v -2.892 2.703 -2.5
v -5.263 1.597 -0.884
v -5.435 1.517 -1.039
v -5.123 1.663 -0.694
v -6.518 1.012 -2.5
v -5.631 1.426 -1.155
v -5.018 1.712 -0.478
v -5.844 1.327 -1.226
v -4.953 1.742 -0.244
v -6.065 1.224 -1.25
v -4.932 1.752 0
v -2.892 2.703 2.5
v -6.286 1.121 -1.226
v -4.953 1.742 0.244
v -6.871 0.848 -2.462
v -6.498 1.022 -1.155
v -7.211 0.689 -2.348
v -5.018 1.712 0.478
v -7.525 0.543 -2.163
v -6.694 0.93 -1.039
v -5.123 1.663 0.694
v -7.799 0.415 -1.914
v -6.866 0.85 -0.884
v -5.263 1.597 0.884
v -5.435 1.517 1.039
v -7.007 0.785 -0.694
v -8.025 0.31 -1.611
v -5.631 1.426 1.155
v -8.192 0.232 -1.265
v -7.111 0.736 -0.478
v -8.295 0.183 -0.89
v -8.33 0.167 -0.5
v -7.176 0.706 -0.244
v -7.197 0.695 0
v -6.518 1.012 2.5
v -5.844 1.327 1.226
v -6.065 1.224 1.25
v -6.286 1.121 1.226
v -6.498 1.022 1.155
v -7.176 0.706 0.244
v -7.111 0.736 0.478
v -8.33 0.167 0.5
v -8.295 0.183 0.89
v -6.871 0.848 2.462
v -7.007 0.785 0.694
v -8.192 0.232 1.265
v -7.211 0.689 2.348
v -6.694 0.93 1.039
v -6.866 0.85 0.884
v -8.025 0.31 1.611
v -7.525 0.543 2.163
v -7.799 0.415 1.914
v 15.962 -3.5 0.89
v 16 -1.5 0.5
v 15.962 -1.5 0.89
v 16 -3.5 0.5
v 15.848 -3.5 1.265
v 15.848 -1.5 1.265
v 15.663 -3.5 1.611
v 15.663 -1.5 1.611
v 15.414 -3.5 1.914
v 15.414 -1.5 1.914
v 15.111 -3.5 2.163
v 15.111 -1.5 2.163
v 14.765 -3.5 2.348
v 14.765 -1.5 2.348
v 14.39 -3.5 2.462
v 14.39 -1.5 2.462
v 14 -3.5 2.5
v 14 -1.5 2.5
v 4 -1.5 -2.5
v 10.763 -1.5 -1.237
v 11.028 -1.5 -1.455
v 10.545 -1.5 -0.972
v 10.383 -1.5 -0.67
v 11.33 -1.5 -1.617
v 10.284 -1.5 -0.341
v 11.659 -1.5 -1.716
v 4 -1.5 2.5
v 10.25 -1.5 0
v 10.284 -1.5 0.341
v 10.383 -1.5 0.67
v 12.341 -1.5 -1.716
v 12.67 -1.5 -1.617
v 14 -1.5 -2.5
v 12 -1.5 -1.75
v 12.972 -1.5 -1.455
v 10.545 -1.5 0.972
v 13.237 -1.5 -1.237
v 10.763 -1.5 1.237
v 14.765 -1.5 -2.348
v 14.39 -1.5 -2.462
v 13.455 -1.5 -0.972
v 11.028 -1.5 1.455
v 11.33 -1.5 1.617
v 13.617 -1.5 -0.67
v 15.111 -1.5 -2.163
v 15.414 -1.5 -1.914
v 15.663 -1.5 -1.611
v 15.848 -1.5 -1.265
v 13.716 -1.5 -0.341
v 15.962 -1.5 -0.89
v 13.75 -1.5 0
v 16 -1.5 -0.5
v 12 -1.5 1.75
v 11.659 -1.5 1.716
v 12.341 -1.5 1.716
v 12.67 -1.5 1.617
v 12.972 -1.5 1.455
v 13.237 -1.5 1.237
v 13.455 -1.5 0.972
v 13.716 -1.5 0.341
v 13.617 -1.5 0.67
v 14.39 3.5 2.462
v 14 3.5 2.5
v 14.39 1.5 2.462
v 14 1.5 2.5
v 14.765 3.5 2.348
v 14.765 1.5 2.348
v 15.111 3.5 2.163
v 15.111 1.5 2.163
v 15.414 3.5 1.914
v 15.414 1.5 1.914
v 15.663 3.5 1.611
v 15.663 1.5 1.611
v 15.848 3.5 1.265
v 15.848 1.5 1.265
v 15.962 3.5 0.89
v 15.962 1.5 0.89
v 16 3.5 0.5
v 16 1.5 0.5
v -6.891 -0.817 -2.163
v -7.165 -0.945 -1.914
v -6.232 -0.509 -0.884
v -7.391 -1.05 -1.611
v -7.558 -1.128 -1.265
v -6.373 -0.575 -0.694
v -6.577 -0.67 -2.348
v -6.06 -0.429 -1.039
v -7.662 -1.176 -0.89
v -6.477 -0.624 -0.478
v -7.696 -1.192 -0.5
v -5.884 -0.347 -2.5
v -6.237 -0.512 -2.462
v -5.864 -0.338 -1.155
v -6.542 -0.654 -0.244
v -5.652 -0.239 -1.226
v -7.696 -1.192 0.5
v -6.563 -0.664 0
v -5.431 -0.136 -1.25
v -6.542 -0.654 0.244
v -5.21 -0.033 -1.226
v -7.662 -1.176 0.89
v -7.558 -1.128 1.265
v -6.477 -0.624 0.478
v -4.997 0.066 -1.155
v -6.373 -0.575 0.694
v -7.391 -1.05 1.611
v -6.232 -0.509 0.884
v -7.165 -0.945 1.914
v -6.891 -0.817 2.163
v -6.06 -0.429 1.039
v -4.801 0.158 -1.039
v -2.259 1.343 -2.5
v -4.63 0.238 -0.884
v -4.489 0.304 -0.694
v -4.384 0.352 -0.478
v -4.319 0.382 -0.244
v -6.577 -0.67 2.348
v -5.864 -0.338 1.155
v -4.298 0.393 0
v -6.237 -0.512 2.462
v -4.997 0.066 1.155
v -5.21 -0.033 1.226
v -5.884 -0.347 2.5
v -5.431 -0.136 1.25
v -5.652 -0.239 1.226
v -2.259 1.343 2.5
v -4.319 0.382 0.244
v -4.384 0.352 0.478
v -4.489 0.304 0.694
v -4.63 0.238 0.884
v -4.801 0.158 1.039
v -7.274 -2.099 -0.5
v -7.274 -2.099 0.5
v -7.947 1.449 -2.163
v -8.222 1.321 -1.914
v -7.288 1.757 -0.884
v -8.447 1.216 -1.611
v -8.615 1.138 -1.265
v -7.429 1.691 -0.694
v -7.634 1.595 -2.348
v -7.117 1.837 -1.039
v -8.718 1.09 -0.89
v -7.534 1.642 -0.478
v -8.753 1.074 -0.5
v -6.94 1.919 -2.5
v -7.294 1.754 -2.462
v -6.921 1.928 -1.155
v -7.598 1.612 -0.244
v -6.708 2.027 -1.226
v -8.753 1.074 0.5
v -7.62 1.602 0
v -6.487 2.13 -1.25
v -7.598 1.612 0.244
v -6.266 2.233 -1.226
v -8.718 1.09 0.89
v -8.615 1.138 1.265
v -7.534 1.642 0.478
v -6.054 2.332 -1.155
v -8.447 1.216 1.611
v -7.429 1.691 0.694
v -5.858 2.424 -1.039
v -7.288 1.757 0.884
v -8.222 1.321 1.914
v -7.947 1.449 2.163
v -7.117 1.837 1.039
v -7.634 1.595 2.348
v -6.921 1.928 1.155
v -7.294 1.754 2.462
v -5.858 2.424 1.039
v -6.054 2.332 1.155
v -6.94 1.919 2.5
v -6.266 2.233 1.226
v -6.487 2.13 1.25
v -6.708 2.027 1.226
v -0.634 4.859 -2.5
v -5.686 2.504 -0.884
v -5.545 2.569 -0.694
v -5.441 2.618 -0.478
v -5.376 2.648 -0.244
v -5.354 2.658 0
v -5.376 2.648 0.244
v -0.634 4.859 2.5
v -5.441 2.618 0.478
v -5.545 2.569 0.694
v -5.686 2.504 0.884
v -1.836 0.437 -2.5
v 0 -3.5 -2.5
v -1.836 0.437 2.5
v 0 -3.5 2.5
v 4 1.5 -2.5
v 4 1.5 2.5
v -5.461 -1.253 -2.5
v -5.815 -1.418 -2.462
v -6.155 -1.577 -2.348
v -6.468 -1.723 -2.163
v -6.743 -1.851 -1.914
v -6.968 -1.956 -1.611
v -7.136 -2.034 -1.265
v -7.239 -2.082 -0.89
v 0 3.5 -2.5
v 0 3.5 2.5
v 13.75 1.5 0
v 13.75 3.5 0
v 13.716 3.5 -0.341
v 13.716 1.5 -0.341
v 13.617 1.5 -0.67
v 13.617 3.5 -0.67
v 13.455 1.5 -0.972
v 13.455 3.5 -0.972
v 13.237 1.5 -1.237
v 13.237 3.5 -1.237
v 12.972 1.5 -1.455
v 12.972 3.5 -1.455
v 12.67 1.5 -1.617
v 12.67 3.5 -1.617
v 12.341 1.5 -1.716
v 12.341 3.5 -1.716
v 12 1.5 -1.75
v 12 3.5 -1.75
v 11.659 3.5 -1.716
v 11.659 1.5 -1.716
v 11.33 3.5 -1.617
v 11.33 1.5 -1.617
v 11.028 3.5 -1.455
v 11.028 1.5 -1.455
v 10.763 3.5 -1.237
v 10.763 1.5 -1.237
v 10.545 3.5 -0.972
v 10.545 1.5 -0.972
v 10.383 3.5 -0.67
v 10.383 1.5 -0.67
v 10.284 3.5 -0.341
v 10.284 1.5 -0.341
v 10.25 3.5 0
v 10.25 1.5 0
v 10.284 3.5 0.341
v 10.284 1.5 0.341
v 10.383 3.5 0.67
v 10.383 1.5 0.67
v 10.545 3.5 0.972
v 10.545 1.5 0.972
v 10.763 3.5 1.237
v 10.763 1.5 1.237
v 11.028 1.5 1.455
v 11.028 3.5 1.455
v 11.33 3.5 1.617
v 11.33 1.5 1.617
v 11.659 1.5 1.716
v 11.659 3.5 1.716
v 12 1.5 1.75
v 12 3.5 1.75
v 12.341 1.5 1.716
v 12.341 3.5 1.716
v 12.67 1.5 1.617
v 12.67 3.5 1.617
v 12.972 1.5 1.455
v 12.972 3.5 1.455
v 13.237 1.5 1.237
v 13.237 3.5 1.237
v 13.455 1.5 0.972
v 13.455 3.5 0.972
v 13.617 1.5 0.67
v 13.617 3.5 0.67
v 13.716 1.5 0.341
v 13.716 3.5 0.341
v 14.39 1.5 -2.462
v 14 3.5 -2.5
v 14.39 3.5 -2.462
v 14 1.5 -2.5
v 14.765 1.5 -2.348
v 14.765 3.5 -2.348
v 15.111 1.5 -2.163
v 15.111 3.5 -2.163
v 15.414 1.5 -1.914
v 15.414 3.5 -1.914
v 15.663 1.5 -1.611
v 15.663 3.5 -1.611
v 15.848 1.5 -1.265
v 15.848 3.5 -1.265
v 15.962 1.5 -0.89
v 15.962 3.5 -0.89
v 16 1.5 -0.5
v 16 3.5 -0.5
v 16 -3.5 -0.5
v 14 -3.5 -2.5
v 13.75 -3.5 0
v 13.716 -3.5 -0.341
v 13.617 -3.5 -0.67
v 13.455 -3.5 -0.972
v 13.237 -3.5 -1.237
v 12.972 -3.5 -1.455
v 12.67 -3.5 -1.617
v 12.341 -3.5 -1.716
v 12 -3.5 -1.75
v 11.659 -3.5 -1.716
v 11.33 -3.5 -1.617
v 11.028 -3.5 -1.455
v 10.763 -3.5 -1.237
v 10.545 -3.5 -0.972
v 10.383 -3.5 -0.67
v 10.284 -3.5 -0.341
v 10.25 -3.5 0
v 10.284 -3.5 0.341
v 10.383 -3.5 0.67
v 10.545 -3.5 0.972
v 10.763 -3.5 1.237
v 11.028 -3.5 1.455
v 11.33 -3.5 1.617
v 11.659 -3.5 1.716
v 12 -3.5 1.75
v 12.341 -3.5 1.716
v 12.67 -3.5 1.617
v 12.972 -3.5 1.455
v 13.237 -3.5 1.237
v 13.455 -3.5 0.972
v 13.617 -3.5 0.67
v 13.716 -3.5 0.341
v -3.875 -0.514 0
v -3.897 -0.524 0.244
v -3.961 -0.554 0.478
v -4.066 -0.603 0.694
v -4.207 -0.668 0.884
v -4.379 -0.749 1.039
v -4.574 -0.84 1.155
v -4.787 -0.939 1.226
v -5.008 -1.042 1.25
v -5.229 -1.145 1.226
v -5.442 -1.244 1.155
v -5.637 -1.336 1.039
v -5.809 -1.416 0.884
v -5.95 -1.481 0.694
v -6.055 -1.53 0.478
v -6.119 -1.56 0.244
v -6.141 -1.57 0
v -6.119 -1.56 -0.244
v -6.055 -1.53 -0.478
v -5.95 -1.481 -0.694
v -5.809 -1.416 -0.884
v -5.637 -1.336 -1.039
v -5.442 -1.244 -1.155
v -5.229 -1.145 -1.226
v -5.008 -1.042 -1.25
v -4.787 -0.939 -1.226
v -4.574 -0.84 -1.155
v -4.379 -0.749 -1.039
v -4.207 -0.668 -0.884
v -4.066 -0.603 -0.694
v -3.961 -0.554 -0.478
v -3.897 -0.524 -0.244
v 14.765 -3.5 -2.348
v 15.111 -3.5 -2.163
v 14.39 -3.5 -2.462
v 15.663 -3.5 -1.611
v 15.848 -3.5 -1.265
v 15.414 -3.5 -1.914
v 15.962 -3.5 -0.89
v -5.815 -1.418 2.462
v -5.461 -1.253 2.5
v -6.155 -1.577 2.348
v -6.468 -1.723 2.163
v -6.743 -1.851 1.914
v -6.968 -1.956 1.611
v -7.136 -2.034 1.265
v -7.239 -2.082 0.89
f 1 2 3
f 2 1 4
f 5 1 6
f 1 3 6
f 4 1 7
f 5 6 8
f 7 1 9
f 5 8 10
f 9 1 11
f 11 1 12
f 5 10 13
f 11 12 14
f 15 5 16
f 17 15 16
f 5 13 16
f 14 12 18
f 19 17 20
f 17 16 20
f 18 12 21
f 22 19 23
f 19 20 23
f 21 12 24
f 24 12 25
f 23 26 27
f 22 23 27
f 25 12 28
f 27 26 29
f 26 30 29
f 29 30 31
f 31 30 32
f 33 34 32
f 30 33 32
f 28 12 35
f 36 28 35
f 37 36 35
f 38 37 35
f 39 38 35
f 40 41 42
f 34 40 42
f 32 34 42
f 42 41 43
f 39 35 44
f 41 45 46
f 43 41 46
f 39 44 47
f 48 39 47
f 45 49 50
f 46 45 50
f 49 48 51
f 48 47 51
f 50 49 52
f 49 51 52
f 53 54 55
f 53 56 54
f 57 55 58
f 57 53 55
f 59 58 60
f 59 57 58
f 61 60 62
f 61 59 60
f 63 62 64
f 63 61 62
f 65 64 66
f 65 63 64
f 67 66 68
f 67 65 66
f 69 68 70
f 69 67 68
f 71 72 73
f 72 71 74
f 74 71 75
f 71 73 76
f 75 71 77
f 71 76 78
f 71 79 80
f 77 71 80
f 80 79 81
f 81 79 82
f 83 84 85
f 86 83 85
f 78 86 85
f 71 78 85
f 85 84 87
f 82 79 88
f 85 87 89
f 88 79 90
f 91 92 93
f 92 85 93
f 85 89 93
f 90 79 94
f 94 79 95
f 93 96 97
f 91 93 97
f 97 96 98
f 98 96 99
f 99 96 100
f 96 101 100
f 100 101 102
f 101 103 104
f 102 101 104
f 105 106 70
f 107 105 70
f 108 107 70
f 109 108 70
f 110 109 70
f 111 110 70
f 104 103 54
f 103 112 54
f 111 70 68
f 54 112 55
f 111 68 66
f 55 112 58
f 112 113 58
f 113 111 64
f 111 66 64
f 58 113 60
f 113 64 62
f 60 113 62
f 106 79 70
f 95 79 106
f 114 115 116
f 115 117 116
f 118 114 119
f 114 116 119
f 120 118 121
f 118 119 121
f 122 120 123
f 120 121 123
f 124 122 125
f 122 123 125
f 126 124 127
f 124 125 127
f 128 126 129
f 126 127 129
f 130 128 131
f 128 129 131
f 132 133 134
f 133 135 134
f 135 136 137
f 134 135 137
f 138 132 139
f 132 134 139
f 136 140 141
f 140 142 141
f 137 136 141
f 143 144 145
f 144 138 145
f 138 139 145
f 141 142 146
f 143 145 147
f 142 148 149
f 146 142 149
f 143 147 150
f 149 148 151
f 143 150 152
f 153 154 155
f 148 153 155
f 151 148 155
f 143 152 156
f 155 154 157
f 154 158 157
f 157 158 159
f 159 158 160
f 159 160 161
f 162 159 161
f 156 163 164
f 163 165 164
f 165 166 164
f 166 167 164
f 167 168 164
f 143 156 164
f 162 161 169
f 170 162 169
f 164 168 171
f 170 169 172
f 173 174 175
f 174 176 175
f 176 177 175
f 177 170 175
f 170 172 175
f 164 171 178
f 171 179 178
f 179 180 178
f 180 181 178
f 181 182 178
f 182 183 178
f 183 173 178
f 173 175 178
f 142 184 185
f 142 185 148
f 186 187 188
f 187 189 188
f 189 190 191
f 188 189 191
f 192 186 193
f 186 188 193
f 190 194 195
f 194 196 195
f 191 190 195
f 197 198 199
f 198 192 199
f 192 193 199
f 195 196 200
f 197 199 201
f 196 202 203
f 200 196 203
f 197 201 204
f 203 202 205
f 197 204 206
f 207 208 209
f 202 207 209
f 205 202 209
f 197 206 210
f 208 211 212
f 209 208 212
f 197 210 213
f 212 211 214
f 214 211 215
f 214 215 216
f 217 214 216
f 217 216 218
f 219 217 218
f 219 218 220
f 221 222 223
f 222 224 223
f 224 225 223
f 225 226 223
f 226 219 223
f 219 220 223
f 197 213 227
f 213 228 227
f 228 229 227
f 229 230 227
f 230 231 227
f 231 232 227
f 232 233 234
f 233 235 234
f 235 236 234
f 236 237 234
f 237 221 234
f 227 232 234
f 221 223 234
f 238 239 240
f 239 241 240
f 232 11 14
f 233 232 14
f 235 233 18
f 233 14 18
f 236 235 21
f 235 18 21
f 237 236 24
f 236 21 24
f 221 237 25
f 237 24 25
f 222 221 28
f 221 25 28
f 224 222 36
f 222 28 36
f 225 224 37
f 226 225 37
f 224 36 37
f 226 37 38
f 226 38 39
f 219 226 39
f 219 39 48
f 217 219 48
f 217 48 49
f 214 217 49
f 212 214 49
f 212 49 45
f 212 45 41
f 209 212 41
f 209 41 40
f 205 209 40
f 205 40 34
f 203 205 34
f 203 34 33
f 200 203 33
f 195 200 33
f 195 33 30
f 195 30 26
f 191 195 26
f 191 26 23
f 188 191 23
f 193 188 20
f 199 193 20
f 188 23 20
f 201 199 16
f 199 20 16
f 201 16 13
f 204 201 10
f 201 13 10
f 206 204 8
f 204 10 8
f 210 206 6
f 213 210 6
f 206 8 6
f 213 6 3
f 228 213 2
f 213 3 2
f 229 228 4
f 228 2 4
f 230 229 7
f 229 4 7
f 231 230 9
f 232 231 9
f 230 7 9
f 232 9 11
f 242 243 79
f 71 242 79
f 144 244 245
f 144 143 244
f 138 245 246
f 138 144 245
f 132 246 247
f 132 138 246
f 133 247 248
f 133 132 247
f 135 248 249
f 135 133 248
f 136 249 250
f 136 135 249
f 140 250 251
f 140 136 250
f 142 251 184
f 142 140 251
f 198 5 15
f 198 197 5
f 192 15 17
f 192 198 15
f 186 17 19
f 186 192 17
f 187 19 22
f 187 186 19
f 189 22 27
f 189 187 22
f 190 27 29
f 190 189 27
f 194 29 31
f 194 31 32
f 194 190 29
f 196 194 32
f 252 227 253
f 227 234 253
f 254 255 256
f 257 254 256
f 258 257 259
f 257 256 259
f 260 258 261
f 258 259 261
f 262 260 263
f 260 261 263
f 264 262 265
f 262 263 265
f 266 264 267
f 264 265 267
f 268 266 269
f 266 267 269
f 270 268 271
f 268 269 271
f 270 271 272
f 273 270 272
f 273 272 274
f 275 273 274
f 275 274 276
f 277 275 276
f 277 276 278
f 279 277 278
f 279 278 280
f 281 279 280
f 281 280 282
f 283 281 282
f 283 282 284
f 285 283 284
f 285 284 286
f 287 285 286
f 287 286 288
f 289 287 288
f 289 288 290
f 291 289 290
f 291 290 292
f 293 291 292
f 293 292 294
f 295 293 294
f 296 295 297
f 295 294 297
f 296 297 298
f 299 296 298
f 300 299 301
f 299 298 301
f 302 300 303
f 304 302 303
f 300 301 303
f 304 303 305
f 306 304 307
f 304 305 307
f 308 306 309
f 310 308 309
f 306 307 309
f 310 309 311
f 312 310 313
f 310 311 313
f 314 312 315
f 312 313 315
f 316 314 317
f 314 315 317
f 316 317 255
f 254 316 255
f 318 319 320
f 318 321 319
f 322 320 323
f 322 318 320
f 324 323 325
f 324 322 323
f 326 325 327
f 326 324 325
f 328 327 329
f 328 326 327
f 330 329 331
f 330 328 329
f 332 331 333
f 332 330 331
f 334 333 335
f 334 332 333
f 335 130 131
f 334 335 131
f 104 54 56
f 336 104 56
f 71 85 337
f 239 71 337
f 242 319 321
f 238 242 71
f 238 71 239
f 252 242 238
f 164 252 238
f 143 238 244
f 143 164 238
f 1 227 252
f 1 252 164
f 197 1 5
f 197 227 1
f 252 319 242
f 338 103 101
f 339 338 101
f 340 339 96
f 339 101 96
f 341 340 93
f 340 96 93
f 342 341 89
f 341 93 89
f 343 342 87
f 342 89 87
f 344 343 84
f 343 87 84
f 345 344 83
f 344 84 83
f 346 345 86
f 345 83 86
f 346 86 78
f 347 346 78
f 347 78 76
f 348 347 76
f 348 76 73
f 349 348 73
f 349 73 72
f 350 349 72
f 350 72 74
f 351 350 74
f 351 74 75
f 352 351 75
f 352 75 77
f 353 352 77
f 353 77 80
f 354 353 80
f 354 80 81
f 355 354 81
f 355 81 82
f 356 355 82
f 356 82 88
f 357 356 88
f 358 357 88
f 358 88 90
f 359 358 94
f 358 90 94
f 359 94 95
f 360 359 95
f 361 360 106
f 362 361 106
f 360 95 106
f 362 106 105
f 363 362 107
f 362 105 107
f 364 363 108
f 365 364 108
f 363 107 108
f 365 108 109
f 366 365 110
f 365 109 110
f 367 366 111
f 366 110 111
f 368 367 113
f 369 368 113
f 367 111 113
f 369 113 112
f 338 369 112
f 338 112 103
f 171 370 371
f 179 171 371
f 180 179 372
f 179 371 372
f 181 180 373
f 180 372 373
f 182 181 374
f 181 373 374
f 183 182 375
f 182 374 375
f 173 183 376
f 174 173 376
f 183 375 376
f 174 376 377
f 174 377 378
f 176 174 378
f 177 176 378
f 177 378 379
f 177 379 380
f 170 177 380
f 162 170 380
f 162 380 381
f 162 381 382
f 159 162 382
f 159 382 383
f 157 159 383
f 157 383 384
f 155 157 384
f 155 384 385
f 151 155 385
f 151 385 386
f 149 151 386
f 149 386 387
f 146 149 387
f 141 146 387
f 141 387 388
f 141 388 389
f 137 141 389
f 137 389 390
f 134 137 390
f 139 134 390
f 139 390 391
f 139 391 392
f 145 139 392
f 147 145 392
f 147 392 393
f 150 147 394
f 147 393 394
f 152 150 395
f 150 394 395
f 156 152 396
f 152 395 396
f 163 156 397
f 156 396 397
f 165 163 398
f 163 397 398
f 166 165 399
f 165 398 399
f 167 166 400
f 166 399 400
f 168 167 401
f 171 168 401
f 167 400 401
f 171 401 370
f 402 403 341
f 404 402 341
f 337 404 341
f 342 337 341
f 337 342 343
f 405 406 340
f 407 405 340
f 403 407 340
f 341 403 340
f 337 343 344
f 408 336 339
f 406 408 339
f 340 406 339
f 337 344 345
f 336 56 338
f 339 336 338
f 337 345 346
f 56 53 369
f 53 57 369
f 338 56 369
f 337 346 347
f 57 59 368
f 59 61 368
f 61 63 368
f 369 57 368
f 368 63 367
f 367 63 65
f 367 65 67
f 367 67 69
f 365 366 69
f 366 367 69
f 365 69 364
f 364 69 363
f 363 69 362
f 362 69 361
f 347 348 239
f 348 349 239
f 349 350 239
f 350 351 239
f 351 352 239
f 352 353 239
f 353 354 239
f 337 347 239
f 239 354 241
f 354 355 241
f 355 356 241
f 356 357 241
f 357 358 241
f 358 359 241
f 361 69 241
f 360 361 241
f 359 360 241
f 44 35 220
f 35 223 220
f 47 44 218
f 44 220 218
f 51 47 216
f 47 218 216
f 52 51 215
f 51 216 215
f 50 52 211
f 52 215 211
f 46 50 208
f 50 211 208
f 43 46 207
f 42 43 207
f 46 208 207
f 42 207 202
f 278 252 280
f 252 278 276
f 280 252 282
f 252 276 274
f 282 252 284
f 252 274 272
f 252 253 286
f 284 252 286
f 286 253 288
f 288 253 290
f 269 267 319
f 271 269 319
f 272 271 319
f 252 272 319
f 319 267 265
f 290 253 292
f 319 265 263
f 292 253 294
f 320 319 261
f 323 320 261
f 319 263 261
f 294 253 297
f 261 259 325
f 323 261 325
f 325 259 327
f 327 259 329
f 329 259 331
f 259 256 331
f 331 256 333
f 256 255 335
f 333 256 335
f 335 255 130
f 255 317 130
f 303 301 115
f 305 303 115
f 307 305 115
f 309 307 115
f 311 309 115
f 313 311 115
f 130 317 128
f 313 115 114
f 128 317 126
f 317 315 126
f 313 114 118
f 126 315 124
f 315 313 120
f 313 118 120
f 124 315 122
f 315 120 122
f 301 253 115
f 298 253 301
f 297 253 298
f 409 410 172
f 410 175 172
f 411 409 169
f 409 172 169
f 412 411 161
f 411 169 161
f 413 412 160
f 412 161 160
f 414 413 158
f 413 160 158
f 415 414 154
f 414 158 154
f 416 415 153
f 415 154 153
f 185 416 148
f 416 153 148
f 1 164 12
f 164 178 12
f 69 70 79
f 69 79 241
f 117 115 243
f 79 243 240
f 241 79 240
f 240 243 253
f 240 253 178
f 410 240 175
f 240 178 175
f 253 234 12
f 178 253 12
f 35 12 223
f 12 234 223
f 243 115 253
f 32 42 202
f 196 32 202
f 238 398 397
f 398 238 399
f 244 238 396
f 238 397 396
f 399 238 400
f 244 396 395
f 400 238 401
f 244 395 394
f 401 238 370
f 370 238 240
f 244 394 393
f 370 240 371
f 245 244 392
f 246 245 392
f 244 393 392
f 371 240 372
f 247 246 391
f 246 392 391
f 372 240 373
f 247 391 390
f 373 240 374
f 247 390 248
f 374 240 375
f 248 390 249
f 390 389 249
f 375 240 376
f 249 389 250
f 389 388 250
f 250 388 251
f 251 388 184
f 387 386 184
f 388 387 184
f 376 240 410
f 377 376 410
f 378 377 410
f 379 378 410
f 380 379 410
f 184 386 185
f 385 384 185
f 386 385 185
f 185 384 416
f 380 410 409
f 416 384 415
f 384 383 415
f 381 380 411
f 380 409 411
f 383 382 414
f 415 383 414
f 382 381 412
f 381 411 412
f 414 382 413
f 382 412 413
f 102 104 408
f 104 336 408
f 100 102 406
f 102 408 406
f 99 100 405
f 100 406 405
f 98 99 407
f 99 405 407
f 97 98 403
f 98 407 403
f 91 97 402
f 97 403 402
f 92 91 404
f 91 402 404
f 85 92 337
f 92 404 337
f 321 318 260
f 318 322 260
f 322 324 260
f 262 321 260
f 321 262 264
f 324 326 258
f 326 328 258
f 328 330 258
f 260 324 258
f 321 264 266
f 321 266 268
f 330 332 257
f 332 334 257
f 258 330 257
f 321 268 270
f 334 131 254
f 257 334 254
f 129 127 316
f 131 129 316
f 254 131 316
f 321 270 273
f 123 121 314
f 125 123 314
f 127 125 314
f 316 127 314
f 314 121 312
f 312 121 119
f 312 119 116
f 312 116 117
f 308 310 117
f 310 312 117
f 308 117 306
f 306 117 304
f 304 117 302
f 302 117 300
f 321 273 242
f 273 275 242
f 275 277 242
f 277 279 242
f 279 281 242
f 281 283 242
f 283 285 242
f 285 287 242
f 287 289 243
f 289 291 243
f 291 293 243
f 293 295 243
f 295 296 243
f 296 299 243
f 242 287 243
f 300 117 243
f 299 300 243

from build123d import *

# Parameters (mm, degrees)
BOSS_EXTRUDE1_DEPTH = 2.5
SKETCH2_R           = 1.25
CUT_EXTRUDE1_DEPTH  = 7.931238628
SKETCH3_R           = 1.75
CUT_EXTRUDE2_DEPTH  = 8
FILLET1_R           = 2


with BuildPart() as part:
    # Sketch1 → Boss-Extrude1 (new body, symmetric)
    with BuildSketch(Plane.XY):
        Polygon((16, -1.5), (16, -3.5), (0, -3.5), (-1.835919027, 0.43714106), (-7.27376575, -2.098568511), (-7.696384011, -1.192260724), (-2.258537289, 1.343448847), (-2.892464682, 2.702910527), (-8.330311404, 0.167200957), (-8.752929666, 1.073508744), (-0.633927393, 4.859461681), (0, 3.5), (16, 3.5), (16, 1.5), (4, 1.5), (4, -1.5), align=None)
    extrude(amount=BOSS_EXTRUDE1_DEPTH, both=True)

    # Sketch2 → Cut-Extrude1 (cut, through all)
    with BuildSketch(Plane(origin=(-0.495341252, 1.062262743, 0), x_dir=(0.906307787, 0.422618262, 0), z_dir=(0.422618262, -0.906307787, 0))):
        with Locations((-4.979163916, 0)):
            Circle(SKETCH2_R)
    extrude(amount=-CUT_EXTRUDE1_DEPTH, mode=Mode.SUBTRACT)

    # Sketch3 → Cut-Extrude2 (cut, through all)
    with BuildSketch(Plane(origin=(0, 3.5, 0), x_dir=(1, 0, 0), z_dir=(0, 1, 0))):
        with Locations((12, 0)):
            Circle(SKETCH3_R)
    extrude(amount=-CUT_EXTRUDE2_DEPTH, mode=Mode.SUBTRACT)

    # Fillet1
    fillet1_edges = [part.edges().sort_by_distance(p)[0] for p in [
        (-7.485074881, -1.645414617, -2.5),
        (-8.541620535, 0.62035485, -2.5),
        (16, 2.5, -2.5),
        (16, -2.5, -2.5),
        (16, 2.5, 2.5),
        (-8.541620535, 0.62035485, 2.5),
        (16, -2.5, 2.5),
        (-7.485074881, -1.645414617, 2.5),
    ]]
    fillet(fillet1_edges, radius=FILLET1_R)


solid = part.part
